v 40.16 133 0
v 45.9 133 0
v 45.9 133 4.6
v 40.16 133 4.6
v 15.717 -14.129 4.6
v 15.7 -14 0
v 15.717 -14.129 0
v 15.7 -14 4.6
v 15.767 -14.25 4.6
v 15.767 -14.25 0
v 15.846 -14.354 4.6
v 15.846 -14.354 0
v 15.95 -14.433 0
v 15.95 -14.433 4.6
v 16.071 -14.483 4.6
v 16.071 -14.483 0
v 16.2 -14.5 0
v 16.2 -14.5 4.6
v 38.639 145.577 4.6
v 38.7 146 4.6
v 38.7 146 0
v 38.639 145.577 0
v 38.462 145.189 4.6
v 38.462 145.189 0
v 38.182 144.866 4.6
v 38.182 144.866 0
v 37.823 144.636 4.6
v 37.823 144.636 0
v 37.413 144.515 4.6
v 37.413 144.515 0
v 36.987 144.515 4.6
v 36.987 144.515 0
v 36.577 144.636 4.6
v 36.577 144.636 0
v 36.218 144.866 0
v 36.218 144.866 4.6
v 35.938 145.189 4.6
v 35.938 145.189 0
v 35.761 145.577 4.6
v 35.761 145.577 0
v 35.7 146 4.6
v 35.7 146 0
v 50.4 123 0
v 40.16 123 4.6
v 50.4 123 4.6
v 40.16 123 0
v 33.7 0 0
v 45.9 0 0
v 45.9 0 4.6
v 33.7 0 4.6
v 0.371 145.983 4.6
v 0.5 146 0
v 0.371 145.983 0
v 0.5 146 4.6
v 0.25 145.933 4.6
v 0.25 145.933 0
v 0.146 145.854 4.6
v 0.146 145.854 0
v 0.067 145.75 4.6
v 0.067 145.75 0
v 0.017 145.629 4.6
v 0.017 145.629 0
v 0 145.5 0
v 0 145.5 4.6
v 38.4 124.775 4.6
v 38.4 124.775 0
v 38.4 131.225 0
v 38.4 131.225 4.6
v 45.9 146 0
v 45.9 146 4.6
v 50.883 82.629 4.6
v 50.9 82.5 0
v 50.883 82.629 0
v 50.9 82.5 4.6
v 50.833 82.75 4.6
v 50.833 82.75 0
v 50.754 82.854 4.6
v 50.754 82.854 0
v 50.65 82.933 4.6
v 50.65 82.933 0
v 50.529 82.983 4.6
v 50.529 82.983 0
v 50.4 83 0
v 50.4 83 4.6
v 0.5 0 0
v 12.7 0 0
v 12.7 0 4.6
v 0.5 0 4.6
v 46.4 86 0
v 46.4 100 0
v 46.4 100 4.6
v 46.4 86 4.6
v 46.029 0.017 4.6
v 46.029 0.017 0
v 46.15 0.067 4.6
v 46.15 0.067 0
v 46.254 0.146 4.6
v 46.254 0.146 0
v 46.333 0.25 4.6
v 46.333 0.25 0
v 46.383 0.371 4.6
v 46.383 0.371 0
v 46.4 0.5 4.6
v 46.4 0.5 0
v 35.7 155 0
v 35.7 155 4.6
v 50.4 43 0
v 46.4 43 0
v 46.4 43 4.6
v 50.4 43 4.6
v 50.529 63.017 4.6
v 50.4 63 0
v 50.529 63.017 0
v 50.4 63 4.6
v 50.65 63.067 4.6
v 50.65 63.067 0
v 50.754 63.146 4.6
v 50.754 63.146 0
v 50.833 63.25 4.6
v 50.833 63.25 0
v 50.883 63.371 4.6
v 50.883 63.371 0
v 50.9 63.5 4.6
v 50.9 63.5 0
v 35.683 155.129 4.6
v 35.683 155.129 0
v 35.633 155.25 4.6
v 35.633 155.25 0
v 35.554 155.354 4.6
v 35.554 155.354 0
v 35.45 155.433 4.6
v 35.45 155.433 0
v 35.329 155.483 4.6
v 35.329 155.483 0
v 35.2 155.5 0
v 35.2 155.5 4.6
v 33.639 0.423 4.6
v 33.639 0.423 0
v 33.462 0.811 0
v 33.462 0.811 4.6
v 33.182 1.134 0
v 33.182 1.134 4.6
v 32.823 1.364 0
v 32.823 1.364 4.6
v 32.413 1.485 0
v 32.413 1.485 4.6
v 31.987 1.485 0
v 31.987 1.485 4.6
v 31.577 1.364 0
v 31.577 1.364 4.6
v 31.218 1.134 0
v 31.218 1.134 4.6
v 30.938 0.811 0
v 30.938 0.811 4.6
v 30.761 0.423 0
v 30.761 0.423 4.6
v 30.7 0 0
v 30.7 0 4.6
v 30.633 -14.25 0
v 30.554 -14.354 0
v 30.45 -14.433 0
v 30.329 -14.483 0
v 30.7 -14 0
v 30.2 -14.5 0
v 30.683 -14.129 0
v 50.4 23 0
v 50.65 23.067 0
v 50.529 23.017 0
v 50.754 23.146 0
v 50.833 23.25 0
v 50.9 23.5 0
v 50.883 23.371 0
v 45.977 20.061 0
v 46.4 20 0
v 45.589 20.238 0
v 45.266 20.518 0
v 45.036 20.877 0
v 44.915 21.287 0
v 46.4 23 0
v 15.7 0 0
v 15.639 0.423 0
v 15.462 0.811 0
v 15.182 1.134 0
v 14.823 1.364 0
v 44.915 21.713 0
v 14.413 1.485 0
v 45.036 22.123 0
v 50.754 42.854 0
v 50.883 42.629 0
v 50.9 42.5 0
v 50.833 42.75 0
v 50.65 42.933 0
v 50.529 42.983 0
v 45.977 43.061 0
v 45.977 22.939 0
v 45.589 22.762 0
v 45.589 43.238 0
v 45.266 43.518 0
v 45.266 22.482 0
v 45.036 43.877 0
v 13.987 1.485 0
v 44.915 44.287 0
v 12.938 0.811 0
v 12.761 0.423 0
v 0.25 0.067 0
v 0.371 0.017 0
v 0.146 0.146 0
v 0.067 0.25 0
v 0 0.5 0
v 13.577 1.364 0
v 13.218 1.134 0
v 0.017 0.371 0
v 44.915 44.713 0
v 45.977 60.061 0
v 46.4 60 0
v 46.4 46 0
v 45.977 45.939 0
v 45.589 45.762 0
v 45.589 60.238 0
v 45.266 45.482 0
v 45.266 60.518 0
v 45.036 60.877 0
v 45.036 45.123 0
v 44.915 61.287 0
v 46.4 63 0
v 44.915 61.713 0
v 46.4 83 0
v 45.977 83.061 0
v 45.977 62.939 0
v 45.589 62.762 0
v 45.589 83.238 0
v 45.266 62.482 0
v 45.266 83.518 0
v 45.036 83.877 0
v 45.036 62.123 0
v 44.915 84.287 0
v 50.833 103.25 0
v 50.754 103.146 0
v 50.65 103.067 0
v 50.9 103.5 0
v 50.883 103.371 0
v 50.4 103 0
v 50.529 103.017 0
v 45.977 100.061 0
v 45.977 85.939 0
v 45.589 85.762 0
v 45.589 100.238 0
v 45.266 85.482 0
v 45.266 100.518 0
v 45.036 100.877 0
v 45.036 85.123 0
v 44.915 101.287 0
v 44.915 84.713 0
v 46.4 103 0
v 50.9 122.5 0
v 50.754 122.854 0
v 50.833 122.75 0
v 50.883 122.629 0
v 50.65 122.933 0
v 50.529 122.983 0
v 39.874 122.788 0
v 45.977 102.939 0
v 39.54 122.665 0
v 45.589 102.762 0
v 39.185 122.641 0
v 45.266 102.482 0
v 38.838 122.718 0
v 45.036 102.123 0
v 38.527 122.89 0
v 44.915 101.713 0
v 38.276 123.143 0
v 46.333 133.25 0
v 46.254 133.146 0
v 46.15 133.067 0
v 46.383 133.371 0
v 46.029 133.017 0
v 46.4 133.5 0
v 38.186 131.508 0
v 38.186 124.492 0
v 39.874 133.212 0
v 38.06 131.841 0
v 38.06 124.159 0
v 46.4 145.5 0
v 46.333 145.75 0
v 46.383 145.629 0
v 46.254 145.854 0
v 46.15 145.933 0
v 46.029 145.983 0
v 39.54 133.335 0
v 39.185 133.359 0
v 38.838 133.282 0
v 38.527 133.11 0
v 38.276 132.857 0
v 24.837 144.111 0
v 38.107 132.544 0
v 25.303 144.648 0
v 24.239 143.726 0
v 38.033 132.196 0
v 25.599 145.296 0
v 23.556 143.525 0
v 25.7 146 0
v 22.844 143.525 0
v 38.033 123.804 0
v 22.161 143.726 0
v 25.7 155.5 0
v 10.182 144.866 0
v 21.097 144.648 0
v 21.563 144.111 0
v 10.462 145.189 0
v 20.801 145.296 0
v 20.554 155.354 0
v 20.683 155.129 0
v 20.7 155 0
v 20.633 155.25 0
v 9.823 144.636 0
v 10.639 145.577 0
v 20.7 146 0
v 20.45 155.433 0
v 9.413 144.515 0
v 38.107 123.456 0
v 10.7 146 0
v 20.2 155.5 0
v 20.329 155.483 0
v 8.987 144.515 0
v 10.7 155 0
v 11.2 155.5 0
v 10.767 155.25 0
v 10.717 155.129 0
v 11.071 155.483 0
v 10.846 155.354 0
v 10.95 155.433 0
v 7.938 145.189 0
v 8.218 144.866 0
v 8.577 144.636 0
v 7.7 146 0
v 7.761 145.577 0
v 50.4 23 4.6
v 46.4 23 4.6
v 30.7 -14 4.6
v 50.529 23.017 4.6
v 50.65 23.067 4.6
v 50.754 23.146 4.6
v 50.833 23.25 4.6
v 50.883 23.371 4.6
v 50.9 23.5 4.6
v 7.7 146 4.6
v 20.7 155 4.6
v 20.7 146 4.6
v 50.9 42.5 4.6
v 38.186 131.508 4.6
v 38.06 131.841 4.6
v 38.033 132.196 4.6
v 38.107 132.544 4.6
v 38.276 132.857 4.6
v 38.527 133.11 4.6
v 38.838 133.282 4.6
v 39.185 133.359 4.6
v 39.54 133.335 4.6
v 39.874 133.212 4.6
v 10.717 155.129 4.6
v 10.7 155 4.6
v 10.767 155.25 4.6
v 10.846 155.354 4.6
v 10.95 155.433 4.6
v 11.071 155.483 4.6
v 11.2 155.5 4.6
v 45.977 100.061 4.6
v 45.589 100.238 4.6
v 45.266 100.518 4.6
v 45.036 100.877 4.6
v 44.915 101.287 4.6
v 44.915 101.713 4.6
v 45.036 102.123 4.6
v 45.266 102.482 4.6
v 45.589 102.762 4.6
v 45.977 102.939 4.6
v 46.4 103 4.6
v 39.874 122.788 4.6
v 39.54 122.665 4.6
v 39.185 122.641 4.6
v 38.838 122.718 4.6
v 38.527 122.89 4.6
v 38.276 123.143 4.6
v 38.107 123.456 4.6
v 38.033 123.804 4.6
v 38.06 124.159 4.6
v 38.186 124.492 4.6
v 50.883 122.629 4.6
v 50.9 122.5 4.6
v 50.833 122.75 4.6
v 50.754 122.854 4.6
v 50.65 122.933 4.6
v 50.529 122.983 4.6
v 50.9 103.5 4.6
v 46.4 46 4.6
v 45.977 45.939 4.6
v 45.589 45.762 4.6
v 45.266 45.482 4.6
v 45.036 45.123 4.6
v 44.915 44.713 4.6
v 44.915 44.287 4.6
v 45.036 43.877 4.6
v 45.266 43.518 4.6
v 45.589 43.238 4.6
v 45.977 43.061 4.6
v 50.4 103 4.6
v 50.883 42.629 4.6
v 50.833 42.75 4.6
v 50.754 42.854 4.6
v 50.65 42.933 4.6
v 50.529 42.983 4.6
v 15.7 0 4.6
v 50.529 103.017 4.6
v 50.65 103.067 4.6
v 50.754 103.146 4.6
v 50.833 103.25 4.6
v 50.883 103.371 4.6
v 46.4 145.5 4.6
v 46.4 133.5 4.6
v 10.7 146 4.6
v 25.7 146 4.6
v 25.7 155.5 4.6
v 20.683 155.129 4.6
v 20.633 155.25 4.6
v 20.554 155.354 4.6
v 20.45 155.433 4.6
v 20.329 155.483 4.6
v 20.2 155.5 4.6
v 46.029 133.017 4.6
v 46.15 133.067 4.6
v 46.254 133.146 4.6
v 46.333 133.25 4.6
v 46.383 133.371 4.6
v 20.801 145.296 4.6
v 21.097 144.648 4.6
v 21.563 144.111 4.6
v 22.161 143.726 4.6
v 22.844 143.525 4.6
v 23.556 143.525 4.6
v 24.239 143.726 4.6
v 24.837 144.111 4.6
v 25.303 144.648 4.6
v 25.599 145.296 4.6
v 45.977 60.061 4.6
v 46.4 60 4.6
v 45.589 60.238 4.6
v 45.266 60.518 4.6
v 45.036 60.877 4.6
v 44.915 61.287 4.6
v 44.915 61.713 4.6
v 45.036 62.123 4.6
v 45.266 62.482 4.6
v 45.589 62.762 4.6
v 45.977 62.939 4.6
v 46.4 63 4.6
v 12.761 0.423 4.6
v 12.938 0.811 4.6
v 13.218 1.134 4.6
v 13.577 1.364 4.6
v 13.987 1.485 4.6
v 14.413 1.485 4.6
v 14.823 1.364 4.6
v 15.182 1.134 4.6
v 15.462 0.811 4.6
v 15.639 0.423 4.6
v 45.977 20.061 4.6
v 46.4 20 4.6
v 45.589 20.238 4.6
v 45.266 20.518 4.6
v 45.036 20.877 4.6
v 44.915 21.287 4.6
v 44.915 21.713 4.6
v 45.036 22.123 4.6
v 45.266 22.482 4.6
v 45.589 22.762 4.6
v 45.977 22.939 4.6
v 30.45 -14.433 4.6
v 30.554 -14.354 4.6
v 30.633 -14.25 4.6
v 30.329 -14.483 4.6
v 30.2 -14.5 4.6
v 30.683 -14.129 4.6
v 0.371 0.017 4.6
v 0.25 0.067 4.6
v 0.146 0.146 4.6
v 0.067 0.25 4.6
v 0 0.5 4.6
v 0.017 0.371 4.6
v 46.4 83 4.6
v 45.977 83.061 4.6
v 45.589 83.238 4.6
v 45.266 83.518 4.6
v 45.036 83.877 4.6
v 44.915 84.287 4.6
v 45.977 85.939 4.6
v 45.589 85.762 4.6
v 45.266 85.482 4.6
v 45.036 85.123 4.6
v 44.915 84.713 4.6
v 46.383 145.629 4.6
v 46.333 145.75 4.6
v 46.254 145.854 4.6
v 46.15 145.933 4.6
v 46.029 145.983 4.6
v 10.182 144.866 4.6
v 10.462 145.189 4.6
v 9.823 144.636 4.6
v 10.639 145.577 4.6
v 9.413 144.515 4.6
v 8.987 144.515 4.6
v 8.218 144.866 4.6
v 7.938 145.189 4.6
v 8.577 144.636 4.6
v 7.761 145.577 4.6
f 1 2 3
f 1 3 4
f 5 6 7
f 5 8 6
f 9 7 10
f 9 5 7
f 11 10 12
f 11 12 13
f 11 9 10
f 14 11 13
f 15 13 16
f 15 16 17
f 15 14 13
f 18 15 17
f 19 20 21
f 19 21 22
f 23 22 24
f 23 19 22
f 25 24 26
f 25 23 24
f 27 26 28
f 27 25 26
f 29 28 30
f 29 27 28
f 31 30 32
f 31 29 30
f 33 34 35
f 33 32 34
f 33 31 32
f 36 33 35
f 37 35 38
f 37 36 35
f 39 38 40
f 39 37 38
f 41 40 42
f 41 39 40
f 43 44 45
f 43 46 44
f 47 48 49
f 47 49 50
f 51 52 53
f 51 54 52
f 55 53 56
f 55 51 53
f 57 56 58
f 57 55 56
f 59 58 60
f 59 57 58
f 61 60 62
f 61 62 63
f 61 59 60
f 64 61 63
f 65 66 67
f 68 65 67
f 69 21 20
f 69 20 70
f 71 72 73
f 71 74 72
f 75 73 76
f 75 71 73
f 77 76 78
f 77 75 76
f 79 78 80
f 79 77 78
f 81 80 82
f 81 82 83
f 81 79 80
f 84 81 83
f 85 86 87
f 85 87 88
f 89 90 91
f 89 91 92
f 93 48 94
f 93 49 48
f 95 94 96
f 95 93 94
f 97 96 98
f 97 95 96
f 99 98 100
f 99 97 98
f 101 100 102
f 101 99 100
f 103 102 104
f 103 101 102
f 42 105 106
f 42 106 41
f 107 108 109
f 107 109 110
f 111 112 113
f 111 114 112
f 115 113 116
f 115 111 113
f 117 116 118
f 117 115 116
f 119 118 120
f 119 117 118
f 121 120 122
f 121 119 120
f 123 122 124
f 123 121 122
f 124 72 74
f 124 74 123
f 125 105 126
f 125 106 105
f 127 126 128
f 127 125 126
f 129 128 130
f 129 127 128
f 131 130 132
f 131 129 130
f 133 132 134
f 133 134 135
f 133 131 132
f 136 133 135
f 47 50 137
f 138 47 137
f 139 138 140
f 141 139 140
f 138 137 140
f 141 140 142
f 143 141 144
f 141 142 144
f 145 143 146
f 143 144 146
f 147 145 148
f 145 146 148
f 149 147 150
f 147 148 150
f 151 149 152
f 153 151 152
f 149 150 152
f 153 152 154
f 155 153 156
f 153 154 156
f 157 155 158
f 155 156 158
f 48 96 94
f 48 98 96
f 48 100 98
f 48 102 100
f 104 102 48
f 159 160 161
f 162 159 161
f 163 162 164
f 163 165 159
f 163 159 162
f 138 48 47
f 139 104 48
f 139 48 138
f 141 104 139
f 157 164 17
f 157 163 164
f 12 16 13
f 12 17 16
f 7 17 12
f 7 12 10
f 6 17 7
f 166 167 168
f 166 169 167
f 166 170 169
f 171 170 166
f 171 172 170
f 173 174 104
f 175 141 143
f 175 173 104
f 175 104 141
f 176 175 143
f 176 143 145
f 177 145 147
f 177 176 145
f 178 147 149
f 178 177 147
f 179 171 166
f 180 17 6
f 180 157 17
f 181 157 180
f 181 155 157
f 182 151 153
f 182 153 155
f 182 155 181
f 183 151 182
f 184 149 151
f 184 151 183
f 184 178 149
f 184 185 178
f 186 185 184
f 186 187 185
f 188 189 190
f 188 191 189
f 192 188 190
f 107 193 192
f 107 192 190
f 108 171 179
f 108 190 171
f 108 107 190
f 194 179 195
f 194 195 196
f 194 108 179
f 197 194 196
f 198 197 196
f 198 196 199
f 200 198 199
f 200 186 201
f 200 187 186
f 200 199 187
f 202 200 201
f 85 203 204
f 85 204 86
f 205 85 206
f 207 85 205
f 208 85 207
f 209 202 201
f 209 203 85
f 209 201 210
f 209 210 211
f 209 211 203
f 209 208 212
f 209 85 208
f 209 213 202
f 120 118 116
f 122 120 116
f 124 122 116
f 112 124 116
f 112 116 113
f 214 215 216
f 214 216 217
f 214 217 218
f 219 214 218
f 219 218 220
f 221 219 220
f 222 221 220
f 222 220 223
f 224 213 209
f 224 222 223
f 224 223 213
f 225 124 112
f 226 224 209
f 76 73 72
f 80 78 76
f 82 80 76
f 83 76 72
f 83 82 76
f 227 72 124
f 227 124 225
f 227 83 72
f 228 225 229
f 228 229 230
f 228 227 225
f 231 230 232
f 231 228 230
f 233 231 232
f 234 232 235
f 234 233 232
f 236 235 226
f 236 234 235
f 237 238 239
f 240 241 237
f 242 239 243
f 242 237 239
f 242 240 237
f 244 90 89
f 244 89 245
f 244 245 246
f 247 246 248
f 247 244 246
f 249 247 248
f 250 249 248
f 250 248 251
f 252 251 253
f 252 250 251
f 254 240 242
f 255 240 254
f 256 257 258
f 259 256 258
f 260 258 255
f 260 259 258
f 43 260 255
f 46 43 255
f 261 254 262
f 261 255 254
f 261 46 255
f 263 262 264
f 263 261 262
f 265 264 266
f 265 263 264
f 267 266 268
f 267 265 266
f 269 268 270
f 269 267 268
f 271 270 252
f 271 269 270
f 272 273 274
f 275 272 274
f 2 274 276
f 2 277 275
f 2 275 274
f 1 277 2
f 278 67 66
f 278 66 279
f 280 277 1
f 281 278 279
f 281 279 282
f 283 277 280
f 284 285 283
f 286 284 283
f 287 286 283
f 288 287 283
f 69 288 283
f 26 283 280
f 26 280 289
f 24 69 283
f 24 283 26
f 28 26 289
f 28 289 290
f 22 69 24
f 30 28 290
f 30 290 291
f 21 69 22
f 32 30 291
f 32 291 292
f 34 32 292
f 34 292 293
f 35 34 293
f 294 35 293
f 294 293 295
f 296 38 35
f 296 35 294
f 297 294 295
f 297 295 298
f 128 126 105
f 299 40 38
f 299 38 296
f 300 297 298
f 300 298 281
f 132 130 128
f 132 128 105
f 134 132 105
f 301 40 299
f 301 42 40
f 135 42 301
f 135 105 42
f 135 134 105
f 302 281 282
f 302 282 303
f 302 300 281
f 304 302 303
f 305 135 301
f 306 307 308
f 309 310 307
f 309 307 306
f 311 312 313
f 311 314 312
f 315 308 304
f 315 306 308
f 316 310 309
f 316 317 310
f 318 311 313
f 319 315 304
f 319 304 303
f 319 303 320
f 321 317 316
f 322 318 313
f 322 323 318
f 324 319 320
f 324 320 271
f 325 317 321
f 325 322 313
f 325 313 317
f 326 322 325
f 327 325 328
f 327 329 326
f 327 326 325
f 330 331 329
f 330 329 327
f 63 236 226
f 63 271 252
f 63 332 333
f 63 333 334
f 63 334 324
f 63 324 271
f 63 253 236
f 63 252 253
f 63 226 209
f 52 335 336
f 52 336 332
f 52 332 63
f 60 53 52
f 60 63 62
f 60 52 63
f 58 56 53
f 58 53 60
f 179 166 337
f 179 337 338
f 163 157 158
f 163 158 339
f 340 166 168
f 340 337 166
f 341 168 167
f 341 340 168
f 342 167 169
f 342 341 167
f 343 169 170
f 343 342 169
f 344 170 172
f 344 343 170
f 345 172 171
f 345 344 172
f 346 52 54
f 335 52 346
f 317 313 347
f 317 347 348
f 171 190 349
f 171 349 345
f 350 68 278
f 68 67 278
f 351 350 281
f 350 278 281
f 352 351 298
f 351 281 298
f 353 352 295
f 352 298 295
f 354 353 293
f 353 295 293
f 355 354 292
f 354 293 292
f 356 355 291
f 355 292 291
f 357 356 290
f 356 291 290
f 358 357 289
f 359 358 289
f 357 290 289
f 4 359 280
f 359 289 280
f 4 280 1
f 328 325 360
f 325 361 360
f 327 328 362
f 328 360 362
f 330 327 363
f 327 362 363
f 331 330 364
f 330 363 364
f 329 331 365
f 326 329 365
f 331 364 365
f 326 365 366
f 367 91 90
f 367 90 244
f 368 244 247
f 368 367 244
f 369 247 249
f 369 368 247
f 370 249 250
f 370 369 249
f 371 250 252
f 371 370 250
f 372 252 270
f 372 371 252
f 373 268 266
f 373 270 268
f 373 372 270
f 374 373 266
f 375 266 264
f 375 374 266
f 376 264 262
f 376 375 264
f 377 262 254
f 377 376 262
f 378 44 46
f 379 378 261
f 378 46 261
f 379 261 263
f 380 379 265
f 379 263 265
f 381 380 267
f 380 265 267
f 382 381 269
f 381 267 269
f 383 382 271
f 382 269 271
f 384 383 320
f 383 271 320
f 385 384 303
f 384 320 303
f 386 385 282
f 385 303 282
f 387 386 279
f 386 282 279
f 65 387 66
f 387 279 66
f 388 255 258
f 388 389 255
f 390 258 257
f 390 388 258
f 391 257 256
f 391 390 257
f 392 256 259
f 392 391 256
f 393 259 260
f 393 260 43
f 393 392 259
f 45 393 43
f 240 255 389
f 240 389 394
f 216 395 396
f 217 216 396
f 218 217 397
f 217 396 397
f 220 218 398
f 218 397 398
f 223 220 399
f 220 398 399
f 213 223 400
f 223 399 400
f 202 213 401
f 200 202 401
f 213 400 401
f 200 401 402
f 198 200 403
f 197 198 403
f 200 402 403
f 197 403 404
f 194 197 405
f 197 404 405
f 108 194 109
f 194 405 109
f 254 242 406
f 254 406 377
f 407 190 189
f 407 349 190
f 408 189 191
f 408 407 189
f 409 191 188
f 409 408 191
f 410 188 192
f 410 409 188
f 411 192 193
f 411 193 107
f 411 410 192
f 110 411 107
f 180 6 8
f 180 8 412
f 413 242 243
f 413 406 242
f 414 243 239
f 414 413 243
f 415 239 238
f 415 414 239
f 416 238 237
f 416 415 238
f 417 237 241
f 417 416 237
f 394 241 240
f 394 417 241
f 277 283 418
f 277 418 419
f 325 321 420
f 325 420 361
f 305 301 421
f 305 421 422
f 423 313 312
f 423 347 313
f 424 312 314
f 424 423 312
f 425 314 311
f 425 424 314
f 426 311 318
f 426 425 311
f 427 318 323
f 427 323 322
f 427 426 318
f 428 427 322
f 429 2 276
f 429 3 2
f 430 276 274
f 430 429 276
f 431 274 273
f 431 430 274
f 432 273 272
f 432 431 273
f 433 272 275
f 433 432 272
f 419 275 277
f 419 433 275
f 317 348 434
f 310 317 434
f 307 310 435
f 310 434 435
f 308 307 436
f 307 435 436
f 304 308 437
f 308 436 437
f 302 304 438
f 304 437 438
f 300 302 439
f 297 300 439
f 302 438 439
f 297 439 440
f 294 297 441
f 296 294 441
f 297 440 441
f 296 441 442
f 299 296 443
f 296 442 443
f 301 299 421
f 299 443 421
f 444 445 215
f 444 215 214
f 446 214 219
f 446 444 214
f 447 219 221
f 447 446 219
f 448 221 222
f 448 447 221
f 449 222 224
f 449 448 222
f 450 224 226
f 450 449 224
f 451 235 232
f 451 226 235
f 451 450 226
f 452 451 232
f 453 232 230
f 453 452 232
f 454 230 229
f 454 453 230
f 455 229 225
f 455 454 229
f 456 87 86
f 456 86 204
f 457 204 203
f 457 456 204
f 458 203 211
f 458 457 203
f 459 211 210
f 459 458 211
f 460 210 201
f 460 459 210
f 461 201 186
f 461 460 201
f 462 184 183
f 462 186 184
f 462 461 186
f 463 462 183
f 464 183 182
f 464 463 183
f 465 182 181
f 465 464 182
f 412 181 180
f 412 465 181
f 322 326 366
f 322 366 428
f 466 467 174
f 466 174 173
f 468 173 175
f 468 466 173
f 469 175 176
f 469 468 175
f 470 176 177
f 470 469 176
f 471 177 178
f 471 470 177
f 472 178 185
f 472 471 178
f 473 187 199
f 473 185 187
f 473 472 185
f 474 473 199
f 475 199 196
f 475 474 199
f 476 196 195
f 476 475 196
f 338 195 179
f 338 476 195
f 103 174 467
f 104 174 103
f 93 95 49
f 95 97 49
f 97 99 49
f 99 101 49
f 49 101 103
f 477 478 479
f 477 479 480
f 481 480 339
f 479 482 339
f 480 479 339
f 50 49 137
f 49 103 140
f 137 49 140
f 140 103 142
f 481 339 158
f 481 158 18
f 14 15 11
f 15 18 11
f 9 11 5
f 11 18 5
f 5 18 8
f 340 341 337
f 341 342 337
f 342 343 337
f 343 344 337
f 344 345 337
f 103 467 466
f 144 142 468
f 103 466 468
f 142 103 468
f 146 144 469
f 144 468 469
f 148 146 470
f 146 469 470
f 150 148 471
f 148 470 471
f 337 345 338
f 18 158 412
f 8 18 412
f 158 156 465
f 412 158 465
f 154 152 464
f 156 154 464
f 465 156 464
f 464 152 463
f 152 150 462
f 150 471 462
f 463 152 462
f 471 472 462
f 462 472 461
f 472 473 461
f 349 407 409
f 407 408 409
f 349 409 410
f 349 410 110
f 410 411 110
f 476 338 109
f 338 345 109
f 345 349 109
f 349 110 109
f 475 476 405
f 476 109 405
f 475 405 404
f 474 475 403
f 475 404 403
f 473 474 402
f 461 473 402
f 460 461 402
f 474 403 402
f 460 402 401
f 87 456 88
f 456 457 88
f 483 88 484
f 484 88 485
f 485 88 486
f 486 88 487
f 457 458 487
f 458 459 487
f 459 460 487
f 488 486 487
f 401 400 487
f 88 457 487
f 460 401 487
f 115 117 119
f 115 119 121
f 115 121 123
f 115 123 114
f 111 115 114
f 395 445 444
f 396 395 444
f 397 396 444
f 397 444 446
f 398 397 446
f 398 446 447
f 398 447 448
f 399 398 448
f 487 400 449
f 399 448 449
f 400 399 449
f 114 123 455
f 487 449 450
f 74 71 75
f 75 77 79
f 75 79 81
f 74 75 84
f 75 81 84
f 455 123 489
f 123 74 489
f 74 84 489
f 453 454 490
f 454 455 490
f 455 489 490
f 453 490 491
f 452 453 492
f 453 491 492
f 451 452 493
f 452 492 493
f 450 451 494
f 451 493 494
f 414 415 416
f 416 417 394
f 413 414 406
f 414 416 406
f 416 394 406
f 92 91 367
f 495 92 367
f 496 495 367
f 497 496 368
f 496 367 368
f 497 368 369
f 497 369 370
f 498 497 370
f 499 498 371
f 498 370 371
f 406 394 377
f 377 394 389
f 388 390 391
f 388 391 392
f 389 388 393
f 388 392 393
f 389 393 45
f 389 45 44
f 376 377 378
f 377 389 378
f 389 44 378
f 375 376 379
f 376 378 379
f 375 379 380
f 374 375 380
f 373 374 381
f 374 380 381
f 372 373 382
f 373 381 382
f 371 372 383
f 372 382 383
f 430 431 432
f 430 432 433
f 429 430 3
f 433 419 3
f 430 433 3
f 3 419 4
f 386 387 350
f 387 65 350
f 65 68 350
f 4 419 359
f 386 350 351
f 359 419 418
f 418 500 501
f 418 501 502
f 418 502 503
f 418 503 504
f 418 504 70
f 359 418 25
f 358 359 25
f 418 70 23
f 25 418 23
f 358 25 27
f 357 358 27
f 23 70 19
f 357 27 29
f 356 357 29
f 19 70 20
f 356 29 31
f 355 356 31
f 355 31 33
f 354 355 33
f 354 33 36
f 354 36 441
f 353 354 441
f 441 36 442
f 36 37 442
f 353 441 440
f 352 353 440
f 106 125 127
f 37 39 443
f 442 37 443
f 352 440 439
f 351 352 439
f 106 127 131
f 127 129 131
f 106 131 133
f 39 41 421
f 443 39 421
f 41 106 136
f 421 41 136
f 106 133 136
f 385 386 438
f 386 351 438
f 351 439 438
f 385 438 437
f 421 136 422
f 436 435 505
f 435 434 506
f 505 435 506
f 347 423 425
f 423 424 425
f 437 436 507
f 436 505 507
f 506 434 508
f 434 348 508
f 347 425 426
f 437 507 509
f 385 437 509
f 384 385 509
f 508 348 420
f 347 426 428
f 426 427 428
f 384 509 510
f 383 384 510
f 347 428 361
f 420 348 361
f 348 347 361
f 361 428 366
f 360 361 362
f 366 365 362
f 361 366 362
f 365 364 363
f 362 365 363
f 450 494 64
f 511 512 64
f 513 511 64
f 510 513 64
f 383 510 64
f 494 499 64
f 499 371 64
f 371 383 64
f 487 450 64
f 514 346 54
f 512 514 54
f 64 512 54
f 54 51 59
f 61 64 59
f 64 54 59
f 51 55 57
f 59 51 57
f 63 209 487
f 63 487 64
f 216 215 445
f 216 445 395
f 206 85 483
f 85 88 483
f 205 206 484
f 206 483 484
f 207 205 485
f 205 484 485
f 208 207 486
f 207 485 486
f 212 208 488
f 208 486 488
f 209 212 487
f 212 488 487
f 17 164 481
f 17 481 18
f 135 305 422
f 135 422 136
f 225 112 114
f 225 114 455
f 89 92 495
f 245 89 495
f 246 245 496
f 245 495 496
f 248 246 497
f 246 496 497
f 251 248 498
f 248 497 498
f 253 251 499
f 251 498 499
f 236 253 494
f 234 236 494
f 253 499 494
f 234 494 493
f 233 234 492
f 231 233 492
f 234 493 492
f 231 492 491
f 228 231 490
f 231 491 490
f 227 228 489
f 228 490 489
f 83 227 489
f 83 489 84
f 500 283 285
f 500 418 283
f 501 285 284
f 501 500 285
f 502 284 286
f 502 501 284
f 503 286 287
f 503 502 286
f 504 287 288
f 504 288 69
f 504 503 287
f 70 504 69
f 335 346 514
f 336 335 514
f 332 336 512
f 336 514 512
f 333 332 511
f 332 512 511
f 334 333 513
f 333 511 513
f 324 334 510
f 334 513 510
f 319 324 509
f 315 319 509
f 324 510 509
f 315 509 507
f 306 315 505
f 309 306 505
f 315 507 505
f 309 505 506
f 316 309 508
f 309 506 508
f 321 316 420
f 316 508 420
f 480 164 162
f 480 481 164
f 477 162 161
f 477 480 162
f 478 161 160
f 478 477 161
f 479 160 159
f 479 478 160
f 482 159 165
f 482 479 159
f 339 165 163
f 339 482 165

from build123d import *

# Parameters (mm, degrees)
BOSS_EXTRUDE1_DEPTH = 4.6
CUT_EXTRUDE1_DEPTH  = 164.683291756
SKETCH8_W           = 8
SKETCH8_H           = 10
CUT_EXTRUDE4_DEPTH  = 10
SKETCH9_R           = 1.25
CUT_EXTRUDE5_DEPTH  = 10
FILLET1_R           = 0.5


with BuildPart() as part:
    # Sketch1 → Boss-Extrude1 (new body)
    with BuildSketch(Plane.XY):
        Polygon((10.7, 146), (10.7, 155.5), (20.7, 155.5), (20.7, 146), (25.7, 146), (25.7, 155.5), (35.7, 155.5), (35.7, 146), (46.4, 146), (46.4, 123), (50.9, 123), (50.9, 103), (46.4, 103), (46.4, 83), (50.9, 83), (50.9, 63), (46.4, 63), (46.4, 43), (50.9, 43), (50.9, 23), (46.4, 23), (46.4, 0), (30.7, 0), (30.7, -14.5), (15.7, -14.5), (15.7, 0), (0, 0), (0, 146), align=None)
    extrude(amount=BOSS_EXTRUDE1_DEPTH)

    # Sketch2 → Cut-Extrude1 (cut, through all)
    with BuildSketch(Plane.XY.offset(4.6)):
        with BuildLine():
            Line((15.7, 0), (15.7, -5))
            ThreePointArc((15.7, -5), (14.2, -6.5), (12.7, -5))
            Line((12.7, -5), (12.7, 0))
            ThreePointArc((12.7, 0), (14.2, 1.5), (15.7, 0))
        make_face()
        with BuildLine():
            Line((30.7, 0), (30.7, -5))
            ThreePointArc((30.7, -5), (32.2, -6.5), (33.7, -5))
            Line((33.7, -5), (33.7, 0))
            ThreePointArc((33.7, 0), (32.2, 1.5), (30.7, 0))
        make_face()
        with BuildLine():
            Line((46.4, 23), (50.9, 23))
            ThreePointArc((50.9, 23), (52.4, 21.5), (50.9, 20))
            Line((50.9, 20), (46.4, 20))
            ThreePointArc((46.4, 20), (44.9, 21.5), (46.4, 23))
        make_face()
        with BuildLine():
            Line((46.4, 63), (50.9, 63))
            ThreePointArc((50.9, 63), (52.4, 61.5), (50.9, 60))
            Line((50.9, 60), (46.4, 60))
            ThreePointArc((46.4, 60), (44.9, 61.5), (46.4, 63))
        make_face()
        with BuildLine():
            Line((46.4, 103), (50.9, 103))
            ThreePointArc((50.9, 103), (52.4, 101.5), (50.9, 100))
            Line((50.9, 100), (46.4, 100))
            ThreePointArc((46.4, 100), (44.9, 101.5), (46.4, 103))
        make_face()
        with BuildLine():
            Line((46.4, 43), (50.9, 43))
            ThreePointArc((50.9, 43), (52.4, 44.5), (50.9, 46))
            Line((50.9, 46), (46.4, 46))
            ThreePointArc((46.4, 46), (44.9, 44.5), (46.4, 43))
        make_face()
        with BuildLine():
            Line((46.4, 83), (50.9, 83))
            ThreePointArc((50.9, 83), (52.4, 84.5), (50.9, 86))
            Line((50.9, 86), (46.4, 86))
            ThreePointArc((46.4, 86), (44.9, 84.5), (46.4, 83))
        make_face()
        with BuildLine():
            Line((35.7, 146), (35.7, 155.5))
            ThreePointArc((35.7, 155.5), (37.2, 157), (38.7, 155.5))
            Line((38.7, 155.5), (38.7, 146))
            ThreePointArc((38.7, 146), (37.2, 144.5), (35.7, 146))
        make_face()
        with BuildLine():
            Line((25.7, 146), (25.7, 155.5))
            ThreePointArc((25.7, 155.5), (23.2, 158), (20.7, 155.5))
            Line((20.7, 155.5), (20.7, 146))
            ThreePointArc((20.7, 146), (23.2, 143.5), (25.7, 146))
        make_face()
        with BuildLine():
            Line((10.7, 146), (10.7, 155.5))
            ThreePointArc((10.7, 155.5), (9.2, 157), (7.7, 155.5))
            Line((7.7, 155.5), (7.7, 146))
            ThreePointArc((7.7, 146), (9.2, 144.5), (10.7, 146))
        make_face()
    extrude(amount=-CUT_EXTRUDE1_DEPTH, mode=Mode.SUBTRACT)

    # Sketch8 → Cut-Extrude4 (cut)
    with BuildSketch(Plane(origin=(0, 0, 0), x_dir=(-1, 0, 0), z_dir=(0, 0, -1))):
        with Locations((-42.4, 128)):
            Rectangle(SKETCH8_W, SKETCH8_H)
    extrude(amount=-CUT_EXTRUDE4_DEPTH, mode=Mode.SUBTRACT)

    # Sketch9 → Cut-Extrude5 (cut)
    with BuildSketch(Plane(origin=(0, 0, 0), x_dir=(-1, 0, 0), z_dir=(0, 0, -1))):
        with Locations((-39.28, 132.112250035)):
            Circle(SKETCH9_R)
        with Locations((-39.28, 123.887749965)):
            Circle(SKETCH9_R)
    extrude(amount=-CUT_EXTRUDE5_DEPTH, mode=Mode.SUBTRACT)

    # Fillet1
    fillet1_edges = [part.edges().sort_by_distance(p)[0] for p in [
        (46.4, 133, 2.3),
        (0, 146, 2.3),
        (10.7, 155.5, 2.3),
        (20.7, 155.5, 2.3),
        (35.7, 155.5, 2.3),
        (46.4, 146, 2.3),
        (50.9, 123, 2.3),
        (50.9, 103, 2.3),
        (50.9, 83, 2.3),
        (50.9, 63, 2.3),
        (50.9, 43, 2.3),
        (50.9, 23, 2.3),
        (46.4, 0, 2.3),
        (30.7, -14.5, 2.3),
        (15.7, -14.5, 2.3),
        (0, 0, 2.3),
    ]]
    fillet(fillet1_edges, radius=FILLET1_R)


solid = part.part
